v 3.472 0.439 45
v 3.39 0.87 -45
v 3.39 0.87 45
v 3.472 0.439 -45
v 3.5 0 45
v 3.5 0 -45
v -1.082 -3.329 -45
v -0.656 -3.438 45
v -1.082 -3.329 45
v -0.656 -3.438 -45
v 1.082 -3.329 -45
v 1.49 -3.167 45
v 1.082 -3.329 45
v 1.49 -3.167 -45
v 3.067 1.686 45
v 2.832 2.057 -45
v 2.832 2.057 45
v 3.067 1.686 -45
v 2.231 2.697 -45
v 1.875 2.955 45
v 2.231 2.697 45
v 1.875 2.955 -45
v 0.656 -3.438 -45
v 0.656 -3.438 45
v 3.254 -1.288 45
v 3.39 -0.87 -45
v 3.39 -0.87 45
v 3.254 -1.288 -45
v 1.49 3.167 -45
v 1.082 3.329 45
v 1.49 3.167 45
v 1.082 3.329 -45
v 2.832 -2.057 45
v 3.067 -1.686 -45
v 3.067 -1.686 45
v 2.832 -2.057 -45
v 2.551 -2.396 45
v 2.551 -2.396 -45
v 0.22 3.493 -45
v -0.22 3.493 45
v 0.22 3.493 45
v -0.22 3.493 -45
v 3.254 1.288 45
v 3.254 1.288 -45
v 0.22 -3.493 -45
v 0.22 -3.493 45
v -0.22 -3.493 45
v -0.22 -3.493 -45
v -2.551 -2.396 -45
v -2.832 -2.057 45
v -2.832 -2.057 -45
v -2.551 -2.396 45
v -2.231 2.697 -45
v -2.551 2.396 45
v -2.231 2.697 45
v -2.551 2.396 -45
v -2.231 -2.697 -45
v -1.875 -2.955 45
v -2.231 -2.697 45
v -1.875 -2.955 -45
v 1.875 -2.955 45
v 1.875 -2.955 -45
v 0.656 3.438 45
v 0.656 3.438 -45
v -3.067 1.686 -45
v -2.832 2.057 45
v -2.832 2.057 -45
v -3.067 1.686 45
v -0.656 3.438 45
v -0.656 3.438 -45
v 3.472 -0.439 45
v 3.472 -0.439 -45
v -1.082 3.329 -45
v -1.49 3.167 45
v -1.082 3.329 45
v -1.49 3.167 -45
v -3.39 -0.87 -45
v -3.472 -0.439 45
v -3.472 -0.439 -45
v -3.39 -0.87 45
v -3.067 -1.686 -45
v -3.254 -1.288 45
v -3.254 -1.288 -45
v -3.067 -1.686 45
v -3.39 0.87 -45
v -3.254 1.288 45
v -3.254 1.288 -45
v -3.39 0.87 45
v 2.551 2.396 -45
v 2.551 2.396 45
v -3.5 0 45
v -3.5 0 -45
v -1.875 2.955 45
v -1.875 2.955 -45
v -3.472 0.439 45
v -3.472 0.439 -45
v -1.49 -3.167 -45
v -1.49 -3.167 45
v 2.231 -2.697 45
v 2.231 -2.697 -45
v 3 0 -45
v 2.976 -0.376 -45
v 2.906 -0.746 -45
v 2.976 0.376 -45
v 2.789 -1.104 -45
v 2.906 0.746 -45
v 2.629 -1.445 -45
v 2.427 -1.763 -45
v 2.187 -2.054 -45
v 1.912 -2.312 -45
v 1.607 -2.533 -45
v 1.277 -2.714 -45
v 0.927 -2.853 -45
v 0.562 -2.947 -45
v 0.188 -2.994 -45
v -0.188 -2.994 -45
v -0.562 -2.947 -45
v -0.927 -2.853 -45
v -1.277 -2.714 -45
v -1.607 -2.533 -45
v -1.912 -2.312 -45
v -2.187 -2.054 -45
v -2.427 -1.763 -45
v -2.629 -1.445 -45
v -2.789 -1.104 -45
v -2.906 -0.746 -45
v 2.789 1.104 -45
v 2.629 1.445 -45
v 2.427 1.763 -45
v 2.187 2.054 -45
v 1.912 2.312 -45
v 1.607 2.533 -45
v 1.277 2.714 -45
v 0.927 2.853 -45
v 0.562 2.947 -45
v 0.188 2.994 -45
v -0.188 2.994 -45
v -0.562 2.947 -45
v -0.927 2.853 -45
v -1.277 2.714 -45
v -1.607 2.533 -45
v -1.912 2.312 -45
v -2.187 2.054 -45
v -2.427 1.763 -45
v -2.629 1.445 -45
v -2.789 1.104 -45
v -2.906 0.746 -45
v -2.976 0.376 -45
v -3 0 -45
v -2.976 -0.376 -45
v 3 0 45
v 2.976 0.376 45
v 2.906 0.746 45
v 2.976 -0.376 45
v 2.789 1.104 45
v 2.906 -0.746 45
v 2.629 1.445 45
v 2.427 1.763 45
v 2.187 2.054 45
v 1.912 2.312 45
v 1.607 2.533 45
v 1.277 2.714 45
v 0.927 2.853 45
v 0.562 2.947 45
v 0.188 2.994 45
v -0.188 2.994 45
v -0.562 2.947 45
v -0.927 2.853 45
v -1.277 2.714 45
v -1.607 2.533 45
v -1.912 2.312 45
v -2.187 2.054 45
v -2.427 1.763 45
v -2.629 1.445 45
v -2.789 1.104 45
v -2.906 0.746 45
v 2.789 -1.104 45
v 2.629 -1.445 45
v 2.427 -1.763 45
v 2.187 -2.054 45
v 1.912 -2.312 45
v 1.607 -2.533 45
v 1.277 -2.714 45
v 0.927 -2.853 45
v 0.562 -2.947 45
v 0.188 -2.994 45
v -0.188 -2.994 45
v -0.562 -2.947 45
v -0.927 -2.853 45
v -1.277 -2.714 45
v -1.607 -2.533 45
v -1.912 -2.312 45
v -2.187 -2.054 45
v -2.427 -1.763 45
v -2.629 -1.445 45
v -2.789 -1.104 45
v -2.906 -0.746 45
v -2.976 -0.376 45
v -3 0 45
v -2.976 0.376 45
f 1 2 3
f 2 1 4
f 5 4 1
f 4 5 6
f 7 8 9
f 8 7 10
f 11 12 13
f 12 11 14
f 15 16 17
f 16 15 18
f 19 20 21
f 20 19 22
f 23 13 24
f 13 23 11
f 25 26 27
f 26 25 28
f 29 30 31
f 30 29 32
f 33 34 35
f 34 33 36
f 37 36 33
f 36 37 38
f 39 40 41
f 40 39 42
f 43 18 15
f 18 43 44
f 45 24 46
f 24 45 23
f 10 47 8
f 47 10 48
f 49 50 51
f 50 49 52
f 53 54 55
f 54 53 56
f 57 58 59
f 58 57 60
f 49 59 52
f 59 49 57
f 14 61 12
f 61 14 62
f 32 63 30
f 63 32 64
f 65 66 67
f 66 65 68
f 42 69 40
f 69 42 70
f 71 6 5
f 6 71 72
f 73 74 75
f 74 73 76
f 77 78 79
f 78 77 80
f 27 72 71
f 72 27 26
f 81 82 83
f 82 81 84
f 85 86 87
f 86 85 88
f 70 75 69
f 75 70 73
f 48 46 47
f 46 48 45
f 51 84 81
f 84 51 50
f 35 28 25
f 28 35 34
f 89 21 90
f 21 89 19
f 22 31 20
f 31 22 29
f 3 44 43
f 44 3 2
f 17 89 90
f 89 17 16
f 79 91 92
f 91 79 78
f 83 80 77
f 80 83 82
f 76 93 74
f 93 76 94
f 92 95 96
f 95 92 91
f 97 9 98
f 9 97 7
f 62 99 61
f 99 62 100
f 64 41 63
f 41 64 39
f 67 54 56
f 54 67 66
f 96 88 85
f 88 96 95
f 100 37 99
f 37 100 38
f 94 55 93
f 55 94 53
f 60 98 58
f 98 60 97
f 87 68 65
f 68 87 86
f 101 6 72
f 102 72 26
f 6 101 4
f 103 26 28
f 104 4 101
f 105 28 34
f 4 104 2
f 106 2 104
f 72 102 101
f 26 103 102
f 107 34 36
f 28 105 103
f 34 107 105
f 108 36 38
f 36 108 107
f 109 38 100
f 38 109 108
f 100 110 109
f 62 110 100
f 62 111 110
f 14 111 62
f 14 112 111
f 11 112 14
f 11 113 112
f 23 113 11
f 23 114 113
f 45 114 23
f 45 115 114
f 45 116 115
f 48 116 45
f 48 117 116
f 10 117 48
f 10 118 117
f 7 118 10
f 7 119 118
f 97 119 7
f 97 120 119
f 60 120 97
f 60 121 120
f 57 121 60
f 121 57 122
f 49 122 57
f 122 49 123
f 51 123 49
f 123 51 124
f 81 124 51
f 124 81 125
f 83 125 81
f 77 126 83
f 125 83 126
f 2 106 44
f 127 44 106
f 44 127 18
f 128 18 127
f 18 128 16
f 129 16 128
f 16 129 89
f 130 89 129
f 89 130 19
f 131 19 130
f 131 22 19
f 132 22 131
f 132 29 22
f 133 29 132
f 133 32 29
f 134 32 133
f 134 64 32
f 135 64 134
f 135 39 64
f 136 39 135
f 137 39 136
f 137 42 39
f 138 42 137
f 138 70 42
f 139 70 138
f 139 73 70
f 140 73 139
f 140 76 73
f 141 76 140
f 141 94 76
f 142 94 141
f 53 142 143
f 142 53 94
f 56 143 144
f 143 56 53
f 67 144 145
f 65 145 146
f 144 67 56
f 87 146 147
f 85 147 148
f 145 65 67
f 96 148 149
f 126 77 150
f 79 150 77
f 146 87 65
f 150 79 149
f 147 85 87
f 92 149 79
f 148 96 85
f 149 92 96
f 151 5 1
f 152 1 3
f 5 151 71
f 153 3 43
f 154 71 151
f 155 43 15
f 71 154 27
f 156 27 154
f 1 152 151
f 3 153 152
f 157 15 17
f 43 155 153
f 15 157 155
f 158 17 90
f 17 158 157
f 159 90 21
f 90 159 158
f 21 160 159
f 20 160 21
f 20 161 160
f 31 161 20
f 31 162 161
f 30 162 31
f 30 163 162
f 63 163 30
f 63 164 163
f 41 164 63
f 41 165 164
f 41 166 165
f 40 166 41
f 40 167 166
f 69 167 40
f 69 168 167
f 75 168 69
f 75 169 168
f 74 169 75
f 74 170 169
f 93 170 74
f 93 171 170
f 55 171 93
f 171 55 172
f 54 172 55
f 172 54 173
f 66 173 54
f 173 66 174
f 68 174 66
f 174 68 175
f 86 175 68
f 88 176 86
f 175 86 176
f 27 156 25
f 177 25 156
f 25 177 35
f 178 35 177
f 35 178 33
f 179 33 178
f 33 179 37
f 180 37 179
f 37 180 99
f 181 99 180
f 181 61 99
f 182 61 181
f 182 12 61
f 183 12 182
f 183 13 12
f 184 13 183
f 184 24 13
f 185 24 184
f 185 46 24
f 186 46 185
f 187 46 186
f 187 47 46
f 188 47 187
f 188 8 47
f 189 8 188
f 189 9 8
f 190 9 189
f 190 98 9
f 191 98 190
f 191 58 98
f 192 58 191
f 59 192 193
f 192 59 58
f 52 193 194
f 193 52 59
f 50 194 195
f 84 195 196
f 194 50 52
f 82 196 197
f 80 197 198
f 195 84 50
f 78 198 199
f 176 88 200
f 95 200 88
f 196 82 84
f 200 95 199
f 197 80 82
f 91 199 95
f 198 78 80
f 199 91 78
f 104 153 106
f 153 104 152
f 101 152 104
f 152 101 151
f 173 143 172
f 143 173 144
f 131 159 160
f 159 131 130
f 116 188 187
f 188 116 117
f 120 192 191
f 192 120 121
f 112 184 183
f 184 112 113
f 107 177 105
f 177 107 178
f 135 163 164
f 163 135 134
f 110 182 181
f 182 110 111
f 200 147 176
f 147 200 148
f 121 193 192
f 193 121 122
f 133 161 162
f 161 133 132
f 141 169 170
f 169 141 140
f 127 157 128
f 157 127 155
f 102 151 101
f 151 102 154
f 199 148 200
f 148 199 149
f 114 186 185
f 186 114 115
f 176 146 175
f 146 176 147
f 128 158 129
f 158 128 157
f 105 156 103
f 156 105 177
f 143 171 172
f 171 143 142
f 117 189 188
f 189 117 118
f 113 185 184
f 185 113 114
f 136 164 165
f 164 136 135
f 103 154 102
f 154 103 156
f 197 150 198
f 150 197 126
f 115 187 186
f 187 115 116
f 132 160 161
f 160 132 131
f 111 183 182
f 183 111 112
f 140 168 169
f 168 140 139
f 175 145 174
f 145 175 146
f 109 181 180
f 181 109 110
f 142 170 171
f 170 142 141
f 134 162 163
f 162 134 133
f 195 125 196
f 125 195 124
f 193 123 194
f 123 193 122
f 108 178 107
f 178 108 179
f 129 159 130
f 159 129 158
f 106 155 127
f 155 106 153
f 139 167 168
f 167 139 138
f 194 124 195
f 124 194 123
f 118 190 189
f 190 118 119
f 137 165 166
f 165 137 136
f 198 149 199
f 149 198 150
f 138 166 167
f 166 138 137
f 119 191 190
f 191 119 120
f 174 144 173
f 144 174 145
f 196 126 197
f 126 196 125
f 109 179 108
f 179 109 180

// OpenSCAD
$fn = 50;


difference() {
	union() {
		translate(v = [0, 0, -45.0000000000]) {
			cylinder(h = 90, r = 3.5000000000);
		}
	}
	union() {
		translate(v = [0, 0, -100.0000000000]) {
			cylinder(h = 200, r = 3.0000000000);
		}
	}
}
